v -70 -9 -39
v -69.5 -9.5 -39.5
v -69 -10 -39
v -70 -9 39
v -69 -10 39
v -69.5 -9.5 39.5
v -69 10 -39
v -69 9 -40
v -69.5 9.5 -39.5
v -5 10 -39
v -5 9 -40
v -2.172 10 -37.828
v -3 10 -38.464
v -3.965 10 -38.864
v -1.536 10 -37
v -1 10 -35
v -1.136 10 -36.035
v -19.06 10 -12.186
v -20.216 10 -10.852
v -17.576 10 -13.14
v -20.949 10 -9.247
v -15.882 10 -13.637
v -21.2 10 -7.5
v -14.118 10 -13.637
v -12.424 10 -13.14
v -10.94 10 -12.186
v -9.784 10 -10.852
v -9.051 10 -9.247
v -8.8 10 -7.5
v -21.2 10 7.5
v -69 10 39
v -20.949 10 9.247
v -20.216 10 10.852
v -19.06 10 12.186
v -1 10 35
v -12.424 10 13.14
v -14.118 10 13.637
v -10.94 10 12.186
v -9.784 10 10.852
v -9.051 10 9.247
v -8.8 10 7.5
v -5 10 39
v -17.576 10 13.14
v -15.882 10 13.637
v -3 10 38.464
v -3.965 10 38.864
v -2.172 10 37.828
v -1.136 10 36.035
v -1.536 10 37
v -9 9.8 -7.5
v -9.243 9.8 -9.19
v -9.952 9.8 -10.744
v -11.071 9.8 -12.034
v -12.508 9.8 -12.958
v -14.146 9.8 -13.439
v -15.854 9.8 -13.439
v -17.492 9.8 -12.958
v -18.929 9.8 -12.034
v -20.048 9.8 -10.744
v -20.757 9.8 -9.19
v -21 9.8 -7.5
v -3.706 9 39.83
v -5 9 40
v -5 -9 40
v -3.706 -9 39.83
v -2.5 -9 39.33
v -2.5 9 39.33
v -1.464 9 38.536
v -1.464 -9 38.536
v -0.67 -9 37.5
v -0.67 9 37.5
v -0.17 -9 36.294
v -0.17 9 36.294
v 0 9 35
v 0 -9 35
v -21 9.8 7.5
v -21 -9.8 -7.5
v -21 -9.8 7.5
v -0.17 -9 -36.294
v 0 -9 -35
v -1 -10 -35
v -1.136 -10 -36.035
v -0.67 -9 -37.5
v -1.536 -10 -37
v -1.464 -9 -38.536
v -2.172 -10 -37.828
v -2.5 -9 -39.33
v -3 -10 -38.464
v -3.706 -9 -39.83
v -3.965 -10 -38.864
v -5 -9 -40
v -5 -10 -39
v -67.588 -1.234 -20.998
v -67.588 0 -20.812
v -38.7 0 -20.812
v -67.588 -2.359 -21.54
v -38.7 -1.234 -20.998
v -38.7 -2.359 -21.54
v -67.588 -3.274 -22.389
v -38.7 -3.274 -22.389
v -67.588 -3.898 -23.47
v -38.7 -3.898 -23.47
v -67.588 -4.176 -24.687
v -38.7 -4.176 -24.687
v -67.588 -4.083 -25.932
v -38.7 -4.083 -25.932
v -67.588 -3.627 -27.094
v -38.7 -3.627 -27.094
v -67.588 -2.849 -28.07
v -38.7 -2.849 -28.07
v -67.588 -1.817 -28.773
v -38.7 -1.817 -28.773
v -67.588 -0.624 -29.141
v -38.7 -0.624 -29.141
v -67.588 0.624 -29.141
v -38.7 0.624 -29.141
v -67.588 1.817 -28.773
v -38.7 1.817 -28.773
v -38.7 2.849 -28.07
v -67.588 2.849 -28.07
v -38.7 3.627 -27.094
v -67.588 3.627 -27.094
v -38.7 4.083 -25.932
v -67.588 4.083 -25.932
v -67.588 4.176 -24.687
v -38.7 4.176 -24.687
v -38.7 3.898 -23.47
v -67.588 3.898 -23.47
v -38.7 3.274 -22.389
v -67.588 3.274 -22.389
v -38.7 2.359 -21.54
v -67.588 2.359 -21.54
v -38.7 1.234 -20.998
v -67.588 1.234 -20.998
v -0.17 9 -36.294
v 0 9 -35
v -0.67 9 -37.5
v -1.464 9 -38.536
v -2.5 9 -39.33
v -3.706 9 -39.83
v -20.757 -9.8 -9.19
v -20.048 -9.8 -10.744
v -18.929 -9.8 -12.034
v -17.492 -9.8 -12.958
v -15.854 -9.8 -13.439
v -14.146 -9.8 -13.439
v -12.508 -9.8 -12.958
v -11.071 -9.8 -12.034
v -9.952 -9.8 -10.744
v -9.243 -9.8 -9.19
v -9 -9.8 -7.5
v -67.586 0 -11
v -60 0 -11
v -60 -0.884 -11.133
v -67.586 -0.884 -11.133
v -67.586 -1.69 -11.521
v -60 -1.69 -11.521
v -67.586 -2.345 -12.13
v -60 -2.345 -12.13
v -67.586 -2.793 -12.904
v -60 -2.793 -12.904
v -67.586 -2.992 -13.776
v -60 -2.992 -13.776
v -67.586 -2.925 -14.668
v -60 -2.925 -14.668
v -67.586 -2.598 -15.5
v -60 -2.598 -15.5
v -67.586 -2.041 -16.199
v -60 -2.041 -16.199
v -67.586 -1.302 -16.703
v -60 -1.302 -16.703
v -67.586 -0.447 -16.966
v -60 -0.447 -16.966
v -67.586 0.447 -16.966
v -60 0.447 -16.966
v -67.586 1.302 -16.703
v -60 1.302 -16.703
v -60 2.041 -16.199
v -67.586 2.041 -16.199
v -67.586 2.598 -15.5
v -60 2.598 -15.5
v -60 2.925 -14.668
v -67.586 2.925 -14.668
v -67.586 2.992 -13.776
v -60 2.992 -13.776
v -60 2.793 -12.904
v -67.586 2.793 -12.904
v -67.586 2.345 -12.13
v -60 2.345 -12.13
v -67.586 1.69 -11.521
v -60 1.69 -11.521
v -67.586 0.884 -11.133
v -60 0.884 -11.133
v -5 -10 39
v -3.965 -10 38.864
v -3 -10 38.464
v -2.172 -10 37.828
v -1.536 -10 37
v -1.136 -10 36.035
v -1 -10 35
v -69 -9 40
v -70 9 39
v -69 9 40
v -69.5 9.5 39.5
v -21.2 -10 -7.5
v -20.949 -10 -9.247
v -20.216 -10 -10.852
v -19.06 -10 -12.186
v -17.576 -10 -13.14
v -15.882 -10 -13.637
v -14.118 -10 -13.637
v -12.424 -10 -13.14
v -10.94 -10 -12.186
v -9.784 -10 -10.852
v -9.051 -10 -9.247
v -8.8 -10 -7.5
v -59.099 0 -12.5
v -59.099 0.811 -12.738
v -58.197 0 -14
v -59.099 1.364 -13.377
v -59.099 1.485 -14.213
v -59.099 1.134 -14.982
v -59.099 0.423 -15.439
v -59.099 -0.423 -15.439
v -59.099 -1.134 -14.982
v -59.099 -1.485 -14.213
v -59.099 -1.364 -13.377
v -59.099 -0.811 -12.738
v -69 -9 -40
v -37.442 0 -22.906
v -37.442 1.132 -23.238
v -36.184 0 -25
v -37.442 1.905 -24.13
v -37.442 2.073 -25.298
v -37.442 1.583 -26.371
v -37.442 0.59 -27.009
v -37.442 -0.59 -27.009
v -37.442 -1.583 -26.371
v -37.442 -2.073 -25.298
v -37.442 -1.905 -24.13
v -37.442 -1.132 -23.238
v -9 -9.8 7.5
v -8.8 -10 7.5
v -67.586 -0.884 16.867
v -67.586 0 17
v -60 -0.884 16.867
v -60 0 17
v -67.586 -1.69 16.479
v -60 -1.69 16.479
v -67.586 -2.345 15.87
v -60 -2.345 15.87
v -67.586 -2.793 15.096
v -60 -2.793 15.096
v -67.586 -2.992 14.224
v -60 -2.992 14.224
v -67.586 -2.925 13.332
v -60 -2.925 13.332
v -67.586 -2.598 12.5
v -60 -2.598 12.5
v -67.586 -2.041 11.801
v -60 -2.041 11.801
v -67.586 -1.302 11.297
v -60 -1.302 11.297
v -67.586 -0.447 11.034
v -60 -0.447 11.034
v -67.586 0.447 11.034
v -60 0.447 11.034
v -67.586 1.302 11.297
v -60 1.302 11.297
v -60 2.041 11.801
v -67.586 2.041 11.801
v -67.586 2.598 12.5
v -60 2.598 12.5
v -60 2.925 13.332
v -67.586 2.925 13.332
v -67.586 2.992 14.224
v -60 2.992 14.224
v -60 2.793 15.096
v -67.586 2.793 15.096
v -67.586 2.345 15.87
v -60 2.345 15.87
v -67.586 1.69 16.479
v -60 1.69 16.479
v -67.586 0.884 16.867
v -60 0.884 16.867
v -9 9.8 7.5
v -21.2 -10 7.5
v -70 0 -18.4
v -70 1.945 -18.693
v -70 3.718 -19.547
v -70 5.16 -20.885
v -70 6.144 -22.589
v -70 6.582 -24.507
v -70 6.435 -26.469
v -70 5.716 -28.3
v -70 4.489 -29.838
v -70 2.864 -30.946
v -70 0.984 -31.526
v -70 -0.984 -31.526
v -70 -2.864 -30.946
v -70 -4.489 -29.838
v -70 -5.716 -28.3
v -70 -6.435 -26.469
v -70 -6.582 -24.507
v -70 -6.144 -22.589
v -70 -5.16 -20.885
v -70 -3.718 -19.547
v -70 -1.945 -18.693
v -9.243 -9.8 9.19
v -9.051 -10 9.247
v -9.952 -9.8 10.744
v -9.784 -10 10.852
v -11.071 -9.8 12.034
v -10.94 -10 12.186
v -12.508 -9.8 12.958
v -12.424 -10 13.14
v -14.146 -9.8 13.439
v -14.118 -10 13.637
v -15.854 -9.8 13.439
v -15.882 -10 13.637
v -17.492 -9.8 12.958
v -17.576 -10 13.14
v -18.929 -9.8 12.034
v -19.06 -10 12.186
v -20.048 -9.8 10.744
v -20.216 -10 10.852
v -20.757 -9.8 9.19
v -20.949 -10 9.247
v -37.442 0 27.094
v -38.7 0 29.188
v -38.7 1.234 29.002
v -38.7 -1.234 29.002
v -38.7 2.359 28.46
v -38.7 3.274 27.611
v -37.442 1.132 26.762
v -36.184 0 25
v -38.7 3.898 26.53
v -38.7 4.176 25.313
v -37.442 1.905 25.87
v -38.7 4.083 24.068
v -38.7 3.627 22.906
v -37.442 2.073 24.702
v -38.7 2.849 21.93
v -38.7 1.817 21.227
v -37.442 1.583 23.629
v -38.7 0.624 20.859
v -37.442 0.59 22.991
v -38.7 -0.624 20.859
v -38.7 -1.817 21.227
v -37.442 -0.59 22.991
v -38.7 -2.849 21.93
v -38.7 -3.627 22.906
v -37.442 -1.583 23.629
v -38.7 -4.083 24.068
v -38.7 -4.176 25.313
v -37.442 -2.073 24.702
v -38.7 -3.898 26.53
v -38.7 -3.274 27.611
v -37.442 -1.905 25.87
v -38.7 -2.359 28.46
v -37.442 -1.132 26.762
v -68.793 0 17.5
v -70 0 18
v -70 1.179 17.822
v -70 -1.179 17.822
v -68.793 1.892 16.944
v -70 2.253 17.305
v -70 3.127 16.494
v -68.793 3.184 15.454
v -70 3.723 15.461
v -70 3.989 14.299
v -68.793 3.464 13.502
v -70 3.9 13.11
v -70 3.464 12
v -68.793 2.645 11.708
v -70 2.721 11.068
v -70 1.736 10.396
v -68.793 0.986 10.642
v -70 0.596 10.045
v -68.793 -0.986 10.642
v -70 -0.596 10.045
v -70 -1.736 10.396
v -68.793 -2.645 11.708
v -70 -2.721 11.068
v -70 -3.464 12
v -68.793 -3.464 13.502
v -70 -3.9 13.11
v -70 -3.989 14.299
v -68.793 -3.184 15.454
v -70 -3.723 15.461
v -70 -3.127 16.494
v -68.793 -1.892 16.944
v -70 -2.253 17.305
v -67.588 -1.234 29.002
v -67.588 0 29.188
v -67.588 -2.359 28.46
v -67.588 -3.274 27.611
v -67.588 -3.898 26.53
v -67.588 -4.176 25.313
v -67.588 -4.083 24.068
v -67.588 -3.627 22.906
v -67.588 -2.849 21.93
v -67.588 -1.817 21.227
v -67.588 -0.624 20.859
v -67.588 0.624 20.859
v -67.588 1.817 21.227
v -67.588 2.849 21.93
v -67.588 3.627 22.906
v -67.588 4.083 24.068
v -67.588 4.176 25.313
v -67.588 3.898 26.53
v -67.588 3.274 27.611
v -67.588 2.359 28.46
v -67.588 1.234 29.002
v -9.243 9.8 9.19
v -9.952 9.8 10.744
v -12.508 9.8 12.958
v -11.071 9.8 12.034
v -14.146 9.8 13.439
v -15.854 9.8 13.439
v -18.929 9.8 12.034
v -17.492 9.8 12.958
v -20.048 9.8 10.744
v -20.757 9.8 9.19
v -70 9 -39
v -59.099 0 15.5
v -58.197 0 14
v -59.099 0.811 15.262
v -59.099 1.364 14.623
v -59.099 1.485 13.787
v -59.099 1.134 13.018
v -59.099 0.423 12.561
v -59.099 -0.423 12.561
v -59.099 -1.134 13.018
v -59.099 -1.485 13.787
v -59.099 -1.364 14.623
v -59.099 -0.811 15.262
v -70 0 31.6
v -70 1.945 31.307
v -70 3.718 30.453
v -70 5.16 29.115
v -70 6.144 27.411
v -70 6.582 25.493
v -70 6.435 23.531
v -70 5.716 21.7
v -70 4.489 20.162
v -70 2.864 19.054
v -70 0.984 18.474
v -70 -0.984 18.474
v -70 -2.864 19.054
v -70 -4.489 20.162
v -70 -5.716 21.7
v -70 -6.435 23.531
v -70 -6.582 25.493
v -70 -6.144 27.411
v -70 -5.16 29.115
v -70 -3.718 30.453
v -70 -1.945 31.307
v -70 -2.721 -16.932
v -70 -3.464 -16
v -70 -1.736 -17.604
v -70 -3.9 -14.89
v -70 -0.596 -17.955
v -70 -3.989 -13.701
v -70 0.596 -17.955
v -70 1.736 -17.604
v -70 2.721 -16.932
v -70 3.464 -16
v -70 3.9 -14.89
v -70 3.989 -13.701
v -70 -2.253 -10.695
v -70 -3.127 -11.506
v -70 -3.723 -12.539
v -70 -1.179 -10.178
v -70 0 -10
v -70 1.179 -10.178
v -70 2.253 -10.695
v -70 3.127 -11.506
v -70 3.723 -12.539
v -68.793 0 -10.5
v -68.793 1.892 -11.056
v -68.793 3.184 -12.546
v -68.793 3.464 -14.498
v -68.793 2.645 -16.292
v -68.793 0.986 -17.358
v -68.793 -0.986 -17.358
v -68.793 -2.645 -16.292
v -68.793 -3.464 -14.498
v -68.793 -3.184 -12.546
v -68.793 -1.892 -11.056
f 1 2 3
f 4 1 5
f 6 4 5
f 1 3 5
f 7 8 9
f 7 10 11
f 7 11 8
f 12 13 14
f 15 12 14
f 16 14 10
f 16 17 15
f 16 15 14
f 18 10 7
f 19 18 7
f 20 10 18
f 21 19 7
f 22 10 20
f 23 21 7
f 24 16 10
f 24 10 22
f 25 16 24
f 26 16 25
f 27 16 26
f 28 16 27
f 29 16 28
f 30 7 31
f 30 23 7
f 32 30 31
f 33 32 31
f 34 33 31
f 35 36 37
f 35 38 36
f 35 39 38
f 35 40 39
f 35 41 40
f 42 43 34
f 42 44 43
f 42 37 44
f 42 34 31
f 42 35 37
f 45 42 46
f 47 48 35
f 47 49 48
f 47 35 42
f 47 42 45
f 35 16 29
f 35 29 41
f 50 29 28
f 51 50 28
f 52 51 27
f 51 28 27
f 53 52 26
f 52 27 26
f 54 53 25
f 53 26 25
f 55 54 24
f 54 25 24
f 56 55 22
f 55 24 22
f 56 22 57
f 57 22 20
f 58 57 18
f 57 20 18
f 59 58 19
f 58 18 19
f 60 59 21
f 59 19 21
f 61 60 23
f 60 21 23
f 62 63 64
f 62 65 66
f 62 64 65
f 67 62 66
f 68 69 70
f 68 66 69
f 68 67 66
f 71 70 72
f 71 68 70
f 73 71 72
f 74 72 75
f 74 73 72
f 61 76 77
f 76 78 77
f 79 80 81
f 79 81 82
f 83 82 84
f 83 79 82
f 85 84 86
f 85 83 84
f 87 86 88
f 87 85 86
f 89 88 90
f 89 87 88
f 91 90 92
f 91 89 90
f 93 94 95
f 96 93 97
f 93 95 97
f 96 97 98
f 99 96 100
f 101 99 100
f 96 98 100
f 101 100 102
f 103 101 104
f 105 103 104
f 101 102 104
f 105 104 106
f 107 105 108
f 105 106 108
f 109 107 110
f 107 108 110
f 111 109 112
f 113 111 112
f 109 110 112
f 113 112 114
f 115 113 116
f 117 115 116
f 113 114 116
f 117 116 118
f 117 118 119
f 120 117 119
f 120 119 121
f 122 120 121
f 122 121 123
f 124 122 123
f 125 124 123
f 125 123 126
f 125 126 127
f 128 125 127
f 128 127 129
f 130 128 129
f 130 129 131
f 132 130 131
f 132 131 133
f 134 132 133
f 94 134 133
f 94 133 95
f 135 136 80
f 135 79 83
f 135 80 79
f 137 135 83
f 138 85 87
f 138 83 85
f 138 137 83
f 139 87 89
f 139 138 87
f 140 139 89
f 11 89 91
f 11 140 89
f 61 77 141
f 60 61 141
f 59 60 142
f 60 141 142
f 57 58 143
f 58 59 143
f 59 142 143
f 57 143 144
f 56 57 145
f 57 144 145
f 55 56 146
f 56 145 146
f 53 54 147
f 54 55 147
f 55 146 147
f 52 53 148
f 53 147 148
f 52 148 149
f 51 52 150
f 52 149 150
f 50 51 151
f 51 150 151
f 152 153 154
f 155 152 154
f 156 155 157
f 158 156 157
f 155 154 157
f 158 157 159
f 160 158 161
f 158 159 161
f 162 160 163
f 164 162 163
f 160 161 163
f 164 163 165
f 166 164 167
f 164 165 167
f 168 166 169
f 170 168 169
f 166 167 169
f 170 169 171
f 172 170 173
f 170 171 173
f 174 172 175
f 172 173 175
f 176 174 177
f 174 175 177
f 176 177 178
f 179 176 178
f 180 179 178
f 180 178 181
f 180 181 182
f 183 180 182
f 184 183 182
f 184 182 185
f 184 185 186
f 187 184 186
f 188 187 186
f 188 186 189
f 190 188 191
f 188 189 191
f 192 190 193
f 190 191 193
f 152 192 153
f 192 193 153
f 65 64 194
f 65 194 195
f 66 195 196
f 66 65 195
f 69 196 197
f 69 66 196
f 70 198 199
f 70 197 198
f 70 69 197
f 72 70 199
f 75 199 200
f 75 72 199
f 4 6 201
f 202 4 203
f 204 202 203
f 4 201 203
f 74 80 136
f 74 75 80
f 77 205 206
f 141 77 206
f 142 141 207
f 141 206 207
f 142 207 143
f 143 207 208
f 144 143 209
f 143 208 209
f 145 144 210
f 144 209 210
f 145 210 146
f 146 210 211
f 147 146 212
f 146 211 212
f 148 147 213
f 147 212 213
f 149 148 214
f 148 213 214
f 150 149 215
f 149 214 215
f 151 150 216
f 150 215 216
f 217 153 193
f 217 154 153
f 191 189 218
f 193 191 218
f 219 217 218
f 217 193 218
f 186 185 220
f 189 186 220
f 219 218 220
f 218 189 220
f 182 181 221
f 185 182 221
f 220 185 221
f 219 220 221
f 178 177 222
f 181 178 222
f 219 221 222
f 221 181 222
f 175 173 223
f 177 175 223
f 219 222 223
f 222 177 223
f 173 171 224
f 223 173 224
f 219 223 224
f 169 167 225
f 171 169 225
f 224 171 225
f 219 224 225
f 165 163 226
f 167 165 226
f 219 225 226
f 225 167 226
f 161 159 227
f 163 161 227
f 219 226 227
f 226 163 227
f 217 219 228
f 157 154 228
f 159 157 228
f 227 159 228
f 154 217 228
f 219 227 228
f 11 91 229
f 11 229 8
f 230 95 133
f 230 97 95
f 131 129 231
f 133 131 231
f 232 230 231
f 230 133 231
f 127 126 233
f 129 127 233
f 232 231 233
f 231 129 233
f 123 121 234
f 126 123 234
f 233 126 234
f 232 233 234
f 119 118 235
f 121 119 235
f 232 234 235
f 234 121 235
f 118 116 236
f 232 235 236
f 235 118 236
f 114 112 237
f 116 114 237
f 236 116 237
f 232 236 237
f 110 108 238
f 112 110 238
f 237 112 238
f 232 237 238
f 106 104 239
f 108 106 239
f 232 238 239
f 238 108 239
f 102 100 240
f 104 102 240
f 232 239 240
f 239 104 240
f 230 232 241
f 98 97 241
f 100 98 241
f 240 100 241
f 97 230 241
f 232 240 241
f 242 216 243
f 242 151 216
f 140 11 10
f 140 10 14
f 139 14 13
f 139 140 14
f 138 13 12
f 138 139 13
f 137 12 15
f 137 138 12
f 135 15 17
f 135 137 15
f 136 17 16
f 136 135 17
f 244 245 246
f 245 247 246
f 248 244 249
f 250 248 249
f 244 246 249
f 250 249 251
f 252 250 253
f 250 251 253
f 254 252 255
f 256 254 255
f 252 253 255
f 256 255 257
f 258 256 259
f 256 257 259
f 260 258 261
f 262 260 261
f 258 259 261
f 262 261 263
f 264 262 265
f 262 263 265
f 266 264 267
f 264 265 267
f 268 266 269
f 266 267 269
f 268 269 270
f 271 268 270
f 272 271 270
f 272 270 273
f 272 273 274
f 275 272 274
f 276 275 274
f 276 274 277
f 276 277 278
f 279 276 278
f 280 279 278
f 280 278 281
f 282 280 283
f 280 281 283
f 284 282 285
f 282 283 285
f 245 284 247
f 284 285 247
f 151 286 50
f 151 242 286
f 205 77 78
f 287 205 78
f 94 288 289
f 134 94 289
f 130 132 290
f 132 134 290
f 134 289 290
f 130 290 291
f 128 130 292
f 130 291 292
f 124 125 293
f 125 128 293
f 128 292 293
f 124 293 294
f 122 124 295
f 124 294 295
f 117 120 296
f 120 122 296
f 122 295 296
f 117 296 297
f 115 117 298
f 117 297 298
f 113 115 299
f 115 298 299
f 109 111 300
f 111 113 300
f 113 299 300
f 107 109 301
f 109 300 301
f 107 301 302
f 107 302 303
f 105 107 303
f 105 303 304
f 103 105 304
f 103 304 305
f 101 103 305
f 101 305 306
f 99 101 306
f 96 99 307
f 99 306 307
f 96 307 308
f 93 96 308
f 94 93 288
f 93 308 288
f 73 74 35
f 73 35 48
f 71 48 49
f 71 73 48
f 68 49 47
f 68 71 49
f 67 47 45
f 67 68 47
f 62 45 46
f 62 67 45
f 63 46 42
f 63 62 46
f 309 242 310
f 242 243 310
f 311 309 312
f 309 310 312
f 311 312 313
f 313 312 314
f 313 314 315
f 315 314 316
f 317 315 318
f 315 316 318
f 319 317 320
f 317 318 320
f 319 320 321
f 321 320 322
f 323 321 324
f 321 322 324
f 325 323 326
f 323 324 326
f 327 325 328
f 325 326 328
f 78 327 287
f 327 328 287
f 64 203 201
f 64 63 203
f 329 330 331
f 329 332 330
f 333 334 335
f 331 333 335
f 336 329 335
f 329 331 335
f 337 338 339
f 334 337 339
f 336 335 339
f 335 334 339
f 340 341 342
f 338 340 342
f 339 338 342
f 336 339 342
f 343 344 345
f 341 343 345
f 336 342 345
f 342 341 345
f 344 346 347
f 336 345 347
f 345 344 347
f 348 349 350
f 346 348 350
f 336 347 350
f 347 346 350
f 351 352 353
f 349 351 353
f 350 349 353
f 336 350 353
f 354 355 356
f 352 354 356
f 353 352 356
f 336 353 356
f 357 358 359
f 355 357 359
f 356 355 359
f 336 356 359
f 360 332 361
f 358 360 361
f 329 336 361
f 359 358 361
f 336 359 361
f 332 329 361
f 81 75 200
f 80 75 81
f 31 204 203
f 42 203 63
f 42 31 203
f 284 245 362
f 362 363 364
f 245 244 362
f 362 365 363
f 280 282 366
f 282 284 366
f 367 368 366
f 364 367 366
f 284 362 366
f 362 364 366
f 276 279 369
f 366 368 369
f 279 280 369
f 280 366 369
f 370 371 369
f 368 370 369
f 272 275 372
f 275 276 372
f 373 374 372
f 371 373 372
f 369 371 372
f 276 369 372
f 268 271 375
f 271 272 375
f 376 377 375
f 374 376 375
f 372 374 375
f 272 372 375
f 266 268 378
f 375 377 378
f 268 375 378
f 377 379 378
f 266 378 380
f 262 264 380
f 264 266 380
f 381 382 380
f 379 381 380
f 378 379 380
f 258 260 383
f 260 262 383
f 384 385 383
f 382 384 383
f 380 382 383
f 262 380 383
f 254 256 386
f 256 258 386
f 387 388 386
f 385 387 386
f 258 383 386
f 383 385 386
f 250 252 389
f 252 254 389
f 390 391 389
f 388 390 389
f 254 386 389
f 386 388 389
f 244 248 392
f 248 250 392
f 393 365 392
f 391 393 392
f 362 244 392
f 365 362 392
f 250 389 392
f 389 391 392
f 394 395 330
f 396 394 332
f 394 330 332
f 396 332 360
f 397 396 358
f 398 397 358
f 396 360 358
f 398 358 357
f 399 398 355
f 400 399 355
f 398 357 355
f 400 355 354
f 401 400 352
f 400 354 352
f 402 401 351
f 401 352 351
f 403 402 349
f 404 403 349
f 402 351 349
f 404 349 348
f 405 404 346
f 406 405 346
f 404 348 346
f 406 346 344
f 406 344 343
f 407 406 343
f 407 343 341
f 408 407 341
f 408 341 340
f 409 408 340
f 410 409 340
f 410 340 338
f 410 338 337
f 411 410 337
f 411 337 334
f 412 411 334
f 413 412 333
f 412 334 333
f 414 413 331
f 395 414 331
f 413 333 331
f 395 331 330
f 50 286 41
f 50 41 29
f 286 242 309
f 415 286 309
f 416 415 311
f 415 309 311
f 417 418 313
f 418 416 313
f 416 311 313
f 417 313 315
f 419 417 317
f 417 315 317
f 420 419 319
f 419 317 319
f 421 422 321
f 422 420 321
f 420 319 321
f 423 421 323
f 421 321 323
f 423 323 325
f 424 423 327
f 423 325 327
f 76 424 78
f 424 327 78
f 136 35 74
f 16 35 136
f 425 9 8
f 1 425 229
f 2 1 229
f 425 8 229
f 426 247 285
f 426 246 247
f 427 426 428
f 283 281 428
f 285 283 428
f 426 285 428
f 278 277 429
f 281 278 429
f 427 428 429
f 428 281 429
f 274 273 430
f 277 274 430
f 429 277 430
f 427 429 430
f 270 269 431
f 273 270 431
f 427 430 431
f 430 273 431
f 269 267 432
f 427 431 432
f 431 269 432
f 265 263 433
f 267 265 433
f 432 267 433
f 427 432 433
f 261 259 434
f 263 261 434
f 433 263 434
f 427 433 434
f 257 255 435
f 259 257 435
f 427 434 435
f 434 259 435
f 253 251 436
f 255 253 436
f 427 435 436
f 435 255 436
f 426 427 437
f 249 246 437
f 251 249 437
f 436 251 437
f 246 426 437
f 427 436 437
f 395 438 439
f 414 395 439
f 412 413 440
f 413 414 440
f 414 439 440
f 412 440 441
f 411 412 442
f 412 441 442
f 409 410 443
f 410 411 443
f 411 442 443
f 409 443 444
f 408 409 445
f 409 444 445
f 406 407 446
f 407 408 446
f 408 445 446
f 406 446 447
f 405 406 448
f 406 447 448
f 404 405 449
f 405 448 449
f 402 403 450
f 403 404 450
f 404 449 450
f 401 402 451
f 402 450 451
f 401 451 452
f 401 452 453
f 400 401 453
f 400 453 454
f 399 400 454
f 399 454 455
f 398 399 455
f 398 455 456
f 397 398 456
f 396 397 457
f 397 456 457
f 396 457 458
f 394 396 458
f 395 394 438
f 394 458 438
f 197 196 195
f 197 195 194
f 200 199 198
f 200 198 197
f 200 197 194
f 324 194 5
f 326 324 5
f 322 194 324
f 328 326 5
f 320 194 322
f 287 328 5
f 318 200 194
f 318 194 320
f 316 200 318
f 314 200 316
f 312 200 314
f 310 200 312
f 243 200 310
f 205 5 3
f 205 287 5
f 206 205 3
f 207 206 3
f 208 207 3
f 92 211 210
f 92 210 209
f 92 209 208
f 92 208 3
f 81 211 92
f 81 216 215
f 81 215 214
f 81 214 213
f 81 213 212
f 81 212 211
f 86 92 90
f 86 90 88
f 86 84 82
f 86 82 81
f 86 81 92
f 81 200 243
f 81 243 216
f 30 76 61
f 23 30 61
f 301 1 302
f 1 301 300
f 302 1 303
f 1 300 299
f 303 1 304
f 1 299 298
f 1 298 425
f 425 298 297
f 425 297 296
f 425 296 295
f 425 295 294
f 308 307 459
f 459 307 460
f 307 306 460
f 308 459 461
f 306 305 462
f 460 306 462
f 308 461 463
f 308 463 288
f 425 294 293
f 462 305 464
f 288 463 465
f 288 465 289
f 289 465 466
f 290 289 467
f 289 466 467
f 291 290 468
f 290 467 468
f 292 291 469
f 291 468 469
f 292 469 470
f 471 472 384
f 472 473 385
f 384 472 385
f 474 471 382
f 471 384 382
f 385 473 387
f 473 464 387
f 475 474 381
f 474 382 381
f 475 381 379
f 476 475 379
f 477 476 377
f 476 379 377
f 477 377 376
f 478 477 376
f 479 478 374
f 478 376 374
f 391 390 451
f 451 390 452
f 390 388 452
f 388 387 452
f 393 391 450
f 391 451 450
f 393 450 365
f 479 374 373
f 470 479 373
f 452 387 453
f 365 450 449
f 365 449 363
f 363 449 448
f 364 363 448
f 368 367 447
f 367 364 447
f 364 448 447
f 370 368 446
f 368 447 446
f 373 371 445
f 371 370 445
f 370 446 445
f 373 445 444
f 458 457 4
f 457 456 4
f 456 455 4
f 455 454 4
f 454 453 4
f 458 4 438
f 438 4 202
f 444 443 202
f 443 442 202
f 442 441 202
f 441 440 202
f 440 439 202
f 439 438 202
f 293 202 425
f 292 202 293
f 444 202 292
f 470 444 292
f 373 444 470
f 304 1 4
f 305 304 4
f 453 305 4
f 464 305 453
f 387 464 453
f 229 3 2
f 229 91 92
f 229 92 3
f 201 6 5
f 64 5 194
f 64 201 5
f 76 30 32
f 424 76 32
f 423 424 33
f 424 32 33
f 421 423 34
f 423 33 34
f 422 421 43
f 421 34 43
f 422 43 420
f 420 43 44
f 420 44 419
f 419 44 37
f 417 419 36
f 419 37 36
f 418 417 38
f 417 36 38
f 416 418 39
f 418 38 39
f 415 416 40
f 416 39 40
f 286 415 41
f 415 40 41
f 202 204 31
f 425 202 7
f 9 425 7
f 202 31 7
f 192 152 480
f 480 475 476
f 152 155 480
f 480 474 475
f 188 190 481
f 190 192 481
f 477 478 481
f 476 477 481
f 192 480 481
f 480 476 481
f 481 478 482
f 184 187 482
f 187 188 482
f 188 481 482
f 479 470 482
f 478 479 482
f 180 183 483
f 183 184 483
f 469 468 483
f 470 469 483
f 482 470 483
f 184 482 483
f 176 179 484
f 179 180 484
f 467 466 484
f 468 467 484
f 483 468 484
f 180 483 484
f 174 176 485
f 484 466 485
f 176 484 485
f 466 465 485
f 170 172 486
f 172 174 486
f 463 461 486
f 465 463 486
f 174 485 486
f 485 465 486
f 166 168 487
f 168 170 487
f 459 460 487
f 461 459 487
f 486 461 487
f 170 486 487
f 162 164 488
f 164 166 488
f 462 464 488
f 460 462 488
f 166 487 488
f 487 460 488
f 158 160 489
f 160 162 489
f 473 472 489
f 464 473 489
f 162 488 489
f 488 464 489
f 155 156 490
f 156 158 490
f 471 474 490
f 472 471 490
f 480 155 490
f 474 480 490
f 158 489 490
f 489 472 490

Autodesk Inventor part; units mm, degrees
ref_plane "YZ Plane" through (0, 0, 0) normal (1, 0, 0) x (0, 1, 0)
ref_plane "XZ Plane" through (0, 0, 0) normal (0, 1, 0) x (-1, 0, 0)
ref_plane "XY Plane" through (0, 0, 0) normal (0, 0, 1) x (1, 0, 0)
sketch "Эскиз1" plane through (0, 0, 0) normal (1, 0, 0) x (0, 1, 0)
  line L0 (-14, 0) -> (14, 0) projected
  line L1 (0, -56) -> (0, 56) projected
  line L2 (10, 40) -> (-10, 40)
  line L3 (-10, 40) -> (-10, -40)
  line L4 (-10, -40) -> (10, -40)
  line L5 (10, -40) -> (10, 40)
  point P0 (0, 0)
  dimension "d0" = 20
  dimension "d1" = 10
  dimension "d2" = 80
  dimension "d3" = 40
extrude "Выдавливание1" add sketch "Эскиз1" against normal blind 70
fillet "Сопряжение1" radius 5 2 edges at (0, 0, 40) (0, 0, -40)
chamfer "Фаска1" distance 1 angle 45 10 edges at (-37.5, 10, 40) (-1.4645, 10, 38.5355) (0, 10, 0) (-1.4645, 10, -38.5355) (-37.5, 10, -40) (-37.5, -10, 40) (-1.4645, -10, 38.5355) (0, -10, 0) (-1.4645, -10, -38.5355) (-37.5, -10, -40)
chamfer "Фаска2" distance 1 angle 45 4 edges at (-70, 10, 0) (-70, 0, 40) (-70, -10, 0) (-70, 0, -40)
sketch "Эскиз3" plane through (-70, 0, 0) normal (-1, 0, 0) x (0, 0, 1)
  line L0 (-56, 0) -> (56, 0) projected
  line L1 (0, 14) -> (0, -14) projected
  circle A0 centre (14, 0) radius 3
  circle A1 centre (-14, 0) radius 3
  dimension "d42" = 6
  dimension "d43" = 6
  dimension "d44" = 28
  dimension "d45" = 14
hole "Отверстие2" at (-70, 0, 14) at (-70, 0, -14) direction (1, 0, 0) diameter 6 depth 10 tip angle 118 countersink diameter 8 countersink angle 45
sketch "Эскиз4" plane through (-70, 0, 0) normal (-1, 0, 0) x (0, 0, 1)
  line L0 (0, 14) -> (0, -14) projected
  line L1 (-56, 0) -> (56, 0) projected
  circle A0 centre (25, 0) radius 5
  circle A1 centre (-25, 0) radius 5
  point P0 (0, 0)
  dimension "d46" = 10
  dimension "d47" = 50
  dimension "d48" = 25
hole "Отверстие3" at (-70, 0, 25) at (-70, 0, -25) direction (1, 0, 0) diameter 8.376 depth 31.3 tip angle 118 countersink diameter 13.2 countersink angle 90 thread size "M10x1.5" class "6H" standard "ISO Metric profile"
sketch "Эскиз6" plane through (0, 0, 0) normal (0, 1, 0) x (-1, 0, 0)
  line L0 (-14, 0) -> (84, 0) projected
  line L1 (0, -56) -> (0, 56) projected
  line L2 (70, -39) -> (70, 39) projected
  line L3 (15, 7.5) -> (15, -7.5) construction
  arc A0 (21, 7.5) -> (9, 7.5) centre (15, 7.5) ccw
  arc A1 (9, -7.5) -> (21, -7.5) centre (15, -7.5) ccw
  line L4 (21, 7.5) -> (21, -7.5)
  line L5 (9, 7.5) -> (9, -7.5)
  point P0 (0, 0)
  dimension "d56" = 12
  dimension "d57" = 15
  dimension "d58" = 7.5
  dimension "d59" = 55
extrude "Выдавливание2" cut sketch "Эскиз6" along normal through all both and the other way through all
chamfer "Фаска4" distance 0.2 angle 45 8 edges at (-9, -10, 0) (-15, -10, -13.5) (-21, -10, 0) (-15, -10, 13.5) (-21, 10, 0) (-15, 10, -13.5) (-9, 10, 0) (-15, 10, 13.5)
properties part number "ОПОРА_02"
